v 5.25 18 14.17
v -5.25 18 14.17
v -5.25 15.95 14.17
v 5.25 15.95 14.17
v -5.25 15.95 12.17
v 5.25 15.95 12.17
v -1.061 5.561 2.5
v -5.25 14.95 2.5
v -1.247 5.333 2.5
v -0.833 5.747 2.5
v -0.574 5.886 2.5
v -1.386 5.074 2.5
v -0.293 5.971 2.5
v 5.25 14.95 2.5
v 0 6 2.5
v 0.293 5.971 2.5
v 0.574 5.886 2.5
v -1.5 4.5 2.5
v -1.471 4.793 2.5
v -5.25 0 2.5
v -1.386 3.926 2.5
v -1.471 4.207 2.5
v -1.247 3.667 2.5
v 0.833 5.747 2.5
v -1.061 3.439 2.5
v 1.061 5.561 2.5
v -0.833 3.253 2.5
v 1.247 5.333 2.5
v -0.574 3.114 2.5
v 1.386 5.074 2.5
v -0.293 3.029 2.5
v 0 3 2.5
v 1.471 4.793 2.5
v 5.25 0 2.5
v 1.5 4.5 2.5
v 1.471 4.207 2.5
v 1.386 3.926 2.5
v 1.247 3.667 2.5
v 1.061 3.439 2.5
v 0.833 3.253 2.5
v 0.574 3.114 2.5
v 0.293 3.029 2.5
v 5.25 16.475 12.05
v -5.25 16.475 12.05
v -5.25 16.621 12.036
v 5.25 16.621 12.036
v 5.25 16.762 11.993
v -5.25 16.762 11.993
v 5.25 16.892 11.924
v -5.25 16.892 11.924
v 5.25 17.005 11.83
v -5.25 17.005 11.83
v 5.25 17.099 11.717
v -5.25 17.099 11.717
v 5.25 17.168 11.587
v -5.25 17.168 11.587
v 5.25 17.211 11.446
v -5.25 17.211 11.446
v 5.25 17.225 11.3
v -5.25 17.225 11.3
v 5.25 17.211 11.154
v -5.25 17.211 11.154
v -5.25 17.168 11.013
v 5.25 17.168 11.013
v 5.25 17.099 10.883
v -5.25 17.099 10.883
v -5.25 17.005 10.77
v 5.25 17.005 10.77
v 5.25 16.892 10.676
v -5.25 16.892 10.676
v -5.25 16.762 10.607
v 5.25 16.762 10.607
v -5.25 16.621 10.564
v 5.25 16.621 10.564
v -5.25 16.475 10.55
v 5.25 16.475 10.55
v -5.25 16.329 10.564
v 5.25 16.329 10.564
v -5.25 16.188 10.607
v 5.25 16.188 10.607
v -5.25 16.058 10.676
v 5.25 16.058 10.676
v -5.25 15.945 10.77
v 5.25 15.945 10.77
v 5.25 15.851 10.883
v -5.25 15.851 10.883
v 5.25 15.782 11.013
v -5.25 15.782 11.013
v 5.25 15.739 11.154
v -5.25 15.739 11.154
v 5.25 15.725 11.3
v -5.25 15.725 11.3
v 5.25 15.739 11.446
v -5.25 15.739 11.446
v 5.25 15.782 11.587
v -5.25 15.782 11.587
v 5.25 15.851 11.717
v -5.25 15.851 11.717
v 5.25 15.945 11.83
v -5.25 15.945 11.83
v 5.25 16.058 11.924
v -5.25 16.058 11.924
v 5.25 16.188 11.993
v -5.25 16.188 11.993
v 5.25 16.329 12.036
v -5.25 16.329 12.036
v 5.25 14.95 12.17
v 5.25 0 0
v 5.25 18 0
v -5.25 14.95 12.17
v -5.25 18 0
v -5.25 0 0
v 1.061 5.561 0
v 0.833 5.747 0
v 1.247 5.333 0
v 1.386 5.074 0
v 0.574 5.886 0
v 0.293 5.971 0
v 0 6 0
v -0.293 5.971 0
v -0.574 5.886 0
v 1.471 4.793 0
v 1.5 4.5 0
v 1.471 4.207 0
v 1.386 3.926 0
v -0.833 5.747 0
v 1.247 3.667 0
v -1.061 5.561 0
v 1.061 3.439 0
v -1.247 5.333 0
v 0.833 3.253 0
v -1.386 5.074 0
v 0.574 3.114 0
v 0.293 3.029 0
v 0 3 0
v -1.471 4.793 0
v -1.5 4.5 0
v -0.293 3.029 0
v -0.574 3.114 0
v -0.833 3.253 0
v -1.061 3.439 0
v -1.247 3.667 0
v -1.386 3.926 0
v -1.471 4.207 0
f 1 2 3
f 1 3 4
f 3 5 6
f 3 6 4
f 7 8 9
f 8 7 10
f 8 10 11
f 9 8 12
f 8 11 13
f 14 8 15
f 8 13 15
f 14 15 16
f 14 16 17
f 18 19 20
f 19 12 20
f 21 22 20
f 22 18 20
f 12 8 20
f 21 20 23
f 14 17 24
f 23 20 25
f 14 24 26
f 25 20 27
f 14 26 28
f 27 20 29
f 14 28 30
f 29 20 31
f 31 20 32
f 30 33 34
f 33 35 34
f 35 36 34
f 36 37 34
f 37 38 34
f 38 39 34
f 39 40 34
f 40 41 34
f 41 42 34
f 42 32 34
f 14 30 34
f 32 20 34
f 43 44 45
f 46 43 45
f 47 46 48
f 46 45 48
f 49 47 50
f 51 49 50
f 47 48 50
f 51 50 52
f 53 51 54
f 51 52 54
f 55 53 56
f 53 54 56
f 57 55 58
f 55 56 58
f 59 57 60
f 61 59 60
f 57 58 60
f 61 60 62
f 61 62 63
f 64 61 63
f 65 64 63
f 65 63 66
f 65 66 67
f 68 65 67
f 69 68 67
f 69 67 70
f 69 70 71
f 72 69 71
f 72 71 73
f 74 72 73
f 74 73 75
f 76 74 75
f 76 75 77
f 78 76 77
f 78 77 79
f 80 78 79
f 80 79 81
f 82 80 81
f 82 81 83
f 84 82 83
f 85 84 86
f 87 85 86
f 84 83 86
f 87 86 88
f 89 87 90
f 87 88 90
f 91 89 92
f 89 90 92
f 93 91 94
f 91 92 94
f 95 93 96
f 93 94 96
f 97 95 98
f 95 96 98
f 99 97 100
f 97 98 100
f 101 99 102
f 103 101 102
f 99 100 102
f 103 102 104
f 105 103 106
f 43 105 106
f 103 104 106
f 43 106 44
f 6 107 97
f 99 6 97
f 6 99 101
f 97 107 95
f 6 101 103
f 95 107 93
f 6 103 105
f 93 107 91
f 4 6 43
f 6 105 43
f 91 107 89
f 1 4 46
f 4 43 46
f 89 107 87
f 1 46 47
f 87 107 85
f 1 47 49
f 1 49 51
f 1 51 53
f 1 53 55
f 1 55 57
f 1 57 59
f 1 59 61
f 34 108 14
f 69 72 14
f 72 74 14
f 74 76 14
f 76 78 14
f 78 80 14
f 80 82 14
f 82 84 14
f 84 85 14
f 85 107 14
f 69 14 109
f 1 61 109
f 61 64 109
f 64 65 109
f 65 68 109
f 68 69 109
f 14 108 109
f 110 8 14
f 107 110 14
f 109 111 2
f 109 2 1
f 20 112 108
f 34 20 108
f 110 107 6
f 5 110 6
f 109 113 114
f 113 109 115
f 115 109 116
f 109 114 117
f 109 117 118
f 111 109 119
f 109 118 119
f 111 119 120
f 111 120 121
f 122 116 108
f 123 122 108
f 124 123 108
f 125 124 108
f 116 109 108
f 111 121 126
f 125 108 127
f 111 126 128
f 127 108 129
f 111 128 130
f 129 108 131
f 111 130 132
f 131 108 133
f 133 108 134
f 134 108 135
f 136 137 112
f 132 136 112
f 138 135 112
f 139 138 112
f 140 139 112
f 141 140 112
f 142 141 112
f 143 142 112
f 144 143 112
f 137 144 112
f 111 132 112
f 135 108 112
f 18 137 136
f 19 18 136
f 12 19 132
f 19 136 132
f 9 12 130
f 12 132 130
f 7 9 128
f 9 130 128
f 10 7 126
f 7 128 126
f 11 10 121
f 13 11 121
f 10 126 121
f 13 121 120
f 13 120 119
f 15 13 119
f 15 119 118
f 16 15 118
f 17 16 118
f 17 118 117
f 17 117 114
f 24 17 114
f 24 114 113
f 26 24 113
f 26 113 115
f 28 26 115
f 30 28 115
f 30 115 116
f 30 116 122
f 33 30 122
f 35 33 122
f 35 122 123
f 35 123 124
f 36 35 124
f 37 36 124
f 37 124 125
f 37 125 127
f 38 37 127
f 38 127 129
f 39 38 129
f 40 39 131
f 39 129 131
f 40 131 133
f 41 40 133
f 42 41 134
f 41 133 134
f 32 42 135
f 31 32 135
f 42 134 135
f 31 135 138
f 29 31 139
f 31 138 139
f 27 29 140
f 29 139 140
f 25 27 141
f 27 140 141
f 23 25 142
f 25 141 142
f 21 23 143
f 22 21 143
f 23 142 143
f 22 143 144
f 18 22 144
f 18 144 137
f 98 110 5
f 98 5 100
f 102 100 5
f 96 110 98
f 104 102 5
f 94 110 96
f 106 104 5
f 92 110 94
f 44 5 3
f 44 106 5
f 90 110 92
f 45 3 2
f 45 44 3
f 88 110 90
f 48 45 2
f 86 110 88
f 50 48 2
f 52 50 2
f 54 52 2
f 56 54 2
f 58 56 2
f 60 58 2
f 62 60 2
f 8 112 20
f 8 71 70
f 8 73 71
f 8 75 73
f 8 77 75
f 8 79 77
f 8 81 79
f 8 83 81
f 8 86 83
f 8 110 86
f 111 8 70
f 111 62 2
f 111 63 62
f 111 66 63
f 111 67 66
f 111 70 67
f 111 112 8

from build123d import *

# Parameters (mm, degrees)
SKETCH1_W           = 10.5
SKETCH1_H           = 5
BOSS_EXTRUDE1_DEPTH = 18
SKETCH2_W           = 10.5
SKETCH2_H           = 5
BOSS_EXTRUDE2_DEPTH = 7.3
SKETCH3_W           = 10.5
SKETCH3_H           = 1.95
CUT_EXTRUDE1_DEPTH  = 7.3
SKETCH4_W           = 10.5
SKETCH4_H           = 2.5
CUT_EXTRUDE2_DEPTH  = 26.3
SKETCH5_R           = 1.5
CUT_EXTRUDE3_DEPTH  = 26.3
SKETCH6_W           = 1.13
SKETCH6_H           = 3.05
CUT_EXTRUDE4_DEPTH  = 26.3
SKETCH10_W          = 10.5
SKETCH10_H          = 3.05
BOSS_EXTRUDE3_DEPTH = 5.5
SKETCH11_R          = 0.75
CUT_EXTRUDE6_DEPTH  = 12.5
SKETCH12_W          = 2
SKETCH12_H          = 1
CUT_EXTRUDE7_DEPTH  = 12.5


with BuildPart() as part:
    # Sketch1 → Boss-Extrude1 (new body)
    with BuildSketch(Plane(origin=(0, 0, 0), x_dir=(1, 0, 0), z_dir=(0, 1, 0))):
        Rectangle(SKETCH1_W, SKETCH1_H)
    extrude(amount=BOSS_EXTRUDE1_DEPTH)

    # Sketch2 → Boss-Extrude2 (add)
    with BuildSketch(Plane.XY.offset(2.5)):
        with Locations((0, 15.5)):
            Rectangle(SKETCH2_W, SKETCH2_H)
    extrude(amount=BOSS_EXTRUDE2_DEPTH)

    # Sketch3 → Cut-Extrude1 (cut)
    with BuildSketch(Plane.XY.offset(9.8)):
        with Locations((0, 13.975)):
            Rectangle(SKETCH3_W, SKETCH3_H)
    extrude(amount=-CUT_EXTRUDE1_DEPTH, mode=Mode.SUBTRACT)

    # Sketch4 → Cut-Extrude2 (cut)
    with BuildSketch(Plane(origin=(0, 0, 0), x_dir=(-1, 0, 0), z_dir=(0, -1, 0))):
        with Locations((0, 1.25)):
            Rectangle(SKETCH4_W, SKETCH4_H)
    extrude(amount=-CUT_EXTRUDE2_DEPTH, mode=Mode.SUBTRACT)

    # Sketch5 → Cut-Extrude3 (cut)
    with BuildSketch(Plane(origin=(0, 0, 0), x_dir=(-1, 0, 0), z_dir=(0, 0, -1))):
        with Locations((0, 4.5)):
            Circle(SKETCH5_R)
    extrude(amount=-CUT_EXTRUDE3_DEPTH, mode=Mode.SUBTRACT)

    # Sketch6 → Cut-Extrude4 (cut)
    with BuildSketch(Plane.ZY.offset(5.25)):
        with Locations((9.235, 16.475)):
            Rectangle(SKETCH6_W, SKETCH6_H)
    extrude(amount=-CUT_EXTRUDE4_DEPTH, mode=Mode.SUBTRACT)

    # Sketch10 → Boss-Extrude3 (add)
    with BuildSketch(Plane.XY.offset(8.67)):
        with Locations((0, 16.475)):
            Rectangle(SKETCH10_W, SKETCH10_H)
    extrude(amount=BOSS_EXTRUDE3_DEPTH)

    # Sketch11 → Cut-Extrude6 (cut)
    with BuildSketch(Plane.ZY.offset(5.25)):
        with Locations((11.3, 16.475)):
            Circle(SKETCH11_R)
    extrude(amount=-CUT_EXTRUDE6_DEPTH, mode=Mode.SUBTRACT)

    # Sketch12 → Cut-Extrude7 (cut)
    with BuildSketch(Plane.ZY.offset(5.25)):
        with Locations((13.17, 15.45)):
            Rectangle(SKETCH12_W, SKETCH12_H)
    extrude(amount=-CUT_EXTRUDE7_DEPTH, mode=Mode.SUBTRACT)


solid = part.part
